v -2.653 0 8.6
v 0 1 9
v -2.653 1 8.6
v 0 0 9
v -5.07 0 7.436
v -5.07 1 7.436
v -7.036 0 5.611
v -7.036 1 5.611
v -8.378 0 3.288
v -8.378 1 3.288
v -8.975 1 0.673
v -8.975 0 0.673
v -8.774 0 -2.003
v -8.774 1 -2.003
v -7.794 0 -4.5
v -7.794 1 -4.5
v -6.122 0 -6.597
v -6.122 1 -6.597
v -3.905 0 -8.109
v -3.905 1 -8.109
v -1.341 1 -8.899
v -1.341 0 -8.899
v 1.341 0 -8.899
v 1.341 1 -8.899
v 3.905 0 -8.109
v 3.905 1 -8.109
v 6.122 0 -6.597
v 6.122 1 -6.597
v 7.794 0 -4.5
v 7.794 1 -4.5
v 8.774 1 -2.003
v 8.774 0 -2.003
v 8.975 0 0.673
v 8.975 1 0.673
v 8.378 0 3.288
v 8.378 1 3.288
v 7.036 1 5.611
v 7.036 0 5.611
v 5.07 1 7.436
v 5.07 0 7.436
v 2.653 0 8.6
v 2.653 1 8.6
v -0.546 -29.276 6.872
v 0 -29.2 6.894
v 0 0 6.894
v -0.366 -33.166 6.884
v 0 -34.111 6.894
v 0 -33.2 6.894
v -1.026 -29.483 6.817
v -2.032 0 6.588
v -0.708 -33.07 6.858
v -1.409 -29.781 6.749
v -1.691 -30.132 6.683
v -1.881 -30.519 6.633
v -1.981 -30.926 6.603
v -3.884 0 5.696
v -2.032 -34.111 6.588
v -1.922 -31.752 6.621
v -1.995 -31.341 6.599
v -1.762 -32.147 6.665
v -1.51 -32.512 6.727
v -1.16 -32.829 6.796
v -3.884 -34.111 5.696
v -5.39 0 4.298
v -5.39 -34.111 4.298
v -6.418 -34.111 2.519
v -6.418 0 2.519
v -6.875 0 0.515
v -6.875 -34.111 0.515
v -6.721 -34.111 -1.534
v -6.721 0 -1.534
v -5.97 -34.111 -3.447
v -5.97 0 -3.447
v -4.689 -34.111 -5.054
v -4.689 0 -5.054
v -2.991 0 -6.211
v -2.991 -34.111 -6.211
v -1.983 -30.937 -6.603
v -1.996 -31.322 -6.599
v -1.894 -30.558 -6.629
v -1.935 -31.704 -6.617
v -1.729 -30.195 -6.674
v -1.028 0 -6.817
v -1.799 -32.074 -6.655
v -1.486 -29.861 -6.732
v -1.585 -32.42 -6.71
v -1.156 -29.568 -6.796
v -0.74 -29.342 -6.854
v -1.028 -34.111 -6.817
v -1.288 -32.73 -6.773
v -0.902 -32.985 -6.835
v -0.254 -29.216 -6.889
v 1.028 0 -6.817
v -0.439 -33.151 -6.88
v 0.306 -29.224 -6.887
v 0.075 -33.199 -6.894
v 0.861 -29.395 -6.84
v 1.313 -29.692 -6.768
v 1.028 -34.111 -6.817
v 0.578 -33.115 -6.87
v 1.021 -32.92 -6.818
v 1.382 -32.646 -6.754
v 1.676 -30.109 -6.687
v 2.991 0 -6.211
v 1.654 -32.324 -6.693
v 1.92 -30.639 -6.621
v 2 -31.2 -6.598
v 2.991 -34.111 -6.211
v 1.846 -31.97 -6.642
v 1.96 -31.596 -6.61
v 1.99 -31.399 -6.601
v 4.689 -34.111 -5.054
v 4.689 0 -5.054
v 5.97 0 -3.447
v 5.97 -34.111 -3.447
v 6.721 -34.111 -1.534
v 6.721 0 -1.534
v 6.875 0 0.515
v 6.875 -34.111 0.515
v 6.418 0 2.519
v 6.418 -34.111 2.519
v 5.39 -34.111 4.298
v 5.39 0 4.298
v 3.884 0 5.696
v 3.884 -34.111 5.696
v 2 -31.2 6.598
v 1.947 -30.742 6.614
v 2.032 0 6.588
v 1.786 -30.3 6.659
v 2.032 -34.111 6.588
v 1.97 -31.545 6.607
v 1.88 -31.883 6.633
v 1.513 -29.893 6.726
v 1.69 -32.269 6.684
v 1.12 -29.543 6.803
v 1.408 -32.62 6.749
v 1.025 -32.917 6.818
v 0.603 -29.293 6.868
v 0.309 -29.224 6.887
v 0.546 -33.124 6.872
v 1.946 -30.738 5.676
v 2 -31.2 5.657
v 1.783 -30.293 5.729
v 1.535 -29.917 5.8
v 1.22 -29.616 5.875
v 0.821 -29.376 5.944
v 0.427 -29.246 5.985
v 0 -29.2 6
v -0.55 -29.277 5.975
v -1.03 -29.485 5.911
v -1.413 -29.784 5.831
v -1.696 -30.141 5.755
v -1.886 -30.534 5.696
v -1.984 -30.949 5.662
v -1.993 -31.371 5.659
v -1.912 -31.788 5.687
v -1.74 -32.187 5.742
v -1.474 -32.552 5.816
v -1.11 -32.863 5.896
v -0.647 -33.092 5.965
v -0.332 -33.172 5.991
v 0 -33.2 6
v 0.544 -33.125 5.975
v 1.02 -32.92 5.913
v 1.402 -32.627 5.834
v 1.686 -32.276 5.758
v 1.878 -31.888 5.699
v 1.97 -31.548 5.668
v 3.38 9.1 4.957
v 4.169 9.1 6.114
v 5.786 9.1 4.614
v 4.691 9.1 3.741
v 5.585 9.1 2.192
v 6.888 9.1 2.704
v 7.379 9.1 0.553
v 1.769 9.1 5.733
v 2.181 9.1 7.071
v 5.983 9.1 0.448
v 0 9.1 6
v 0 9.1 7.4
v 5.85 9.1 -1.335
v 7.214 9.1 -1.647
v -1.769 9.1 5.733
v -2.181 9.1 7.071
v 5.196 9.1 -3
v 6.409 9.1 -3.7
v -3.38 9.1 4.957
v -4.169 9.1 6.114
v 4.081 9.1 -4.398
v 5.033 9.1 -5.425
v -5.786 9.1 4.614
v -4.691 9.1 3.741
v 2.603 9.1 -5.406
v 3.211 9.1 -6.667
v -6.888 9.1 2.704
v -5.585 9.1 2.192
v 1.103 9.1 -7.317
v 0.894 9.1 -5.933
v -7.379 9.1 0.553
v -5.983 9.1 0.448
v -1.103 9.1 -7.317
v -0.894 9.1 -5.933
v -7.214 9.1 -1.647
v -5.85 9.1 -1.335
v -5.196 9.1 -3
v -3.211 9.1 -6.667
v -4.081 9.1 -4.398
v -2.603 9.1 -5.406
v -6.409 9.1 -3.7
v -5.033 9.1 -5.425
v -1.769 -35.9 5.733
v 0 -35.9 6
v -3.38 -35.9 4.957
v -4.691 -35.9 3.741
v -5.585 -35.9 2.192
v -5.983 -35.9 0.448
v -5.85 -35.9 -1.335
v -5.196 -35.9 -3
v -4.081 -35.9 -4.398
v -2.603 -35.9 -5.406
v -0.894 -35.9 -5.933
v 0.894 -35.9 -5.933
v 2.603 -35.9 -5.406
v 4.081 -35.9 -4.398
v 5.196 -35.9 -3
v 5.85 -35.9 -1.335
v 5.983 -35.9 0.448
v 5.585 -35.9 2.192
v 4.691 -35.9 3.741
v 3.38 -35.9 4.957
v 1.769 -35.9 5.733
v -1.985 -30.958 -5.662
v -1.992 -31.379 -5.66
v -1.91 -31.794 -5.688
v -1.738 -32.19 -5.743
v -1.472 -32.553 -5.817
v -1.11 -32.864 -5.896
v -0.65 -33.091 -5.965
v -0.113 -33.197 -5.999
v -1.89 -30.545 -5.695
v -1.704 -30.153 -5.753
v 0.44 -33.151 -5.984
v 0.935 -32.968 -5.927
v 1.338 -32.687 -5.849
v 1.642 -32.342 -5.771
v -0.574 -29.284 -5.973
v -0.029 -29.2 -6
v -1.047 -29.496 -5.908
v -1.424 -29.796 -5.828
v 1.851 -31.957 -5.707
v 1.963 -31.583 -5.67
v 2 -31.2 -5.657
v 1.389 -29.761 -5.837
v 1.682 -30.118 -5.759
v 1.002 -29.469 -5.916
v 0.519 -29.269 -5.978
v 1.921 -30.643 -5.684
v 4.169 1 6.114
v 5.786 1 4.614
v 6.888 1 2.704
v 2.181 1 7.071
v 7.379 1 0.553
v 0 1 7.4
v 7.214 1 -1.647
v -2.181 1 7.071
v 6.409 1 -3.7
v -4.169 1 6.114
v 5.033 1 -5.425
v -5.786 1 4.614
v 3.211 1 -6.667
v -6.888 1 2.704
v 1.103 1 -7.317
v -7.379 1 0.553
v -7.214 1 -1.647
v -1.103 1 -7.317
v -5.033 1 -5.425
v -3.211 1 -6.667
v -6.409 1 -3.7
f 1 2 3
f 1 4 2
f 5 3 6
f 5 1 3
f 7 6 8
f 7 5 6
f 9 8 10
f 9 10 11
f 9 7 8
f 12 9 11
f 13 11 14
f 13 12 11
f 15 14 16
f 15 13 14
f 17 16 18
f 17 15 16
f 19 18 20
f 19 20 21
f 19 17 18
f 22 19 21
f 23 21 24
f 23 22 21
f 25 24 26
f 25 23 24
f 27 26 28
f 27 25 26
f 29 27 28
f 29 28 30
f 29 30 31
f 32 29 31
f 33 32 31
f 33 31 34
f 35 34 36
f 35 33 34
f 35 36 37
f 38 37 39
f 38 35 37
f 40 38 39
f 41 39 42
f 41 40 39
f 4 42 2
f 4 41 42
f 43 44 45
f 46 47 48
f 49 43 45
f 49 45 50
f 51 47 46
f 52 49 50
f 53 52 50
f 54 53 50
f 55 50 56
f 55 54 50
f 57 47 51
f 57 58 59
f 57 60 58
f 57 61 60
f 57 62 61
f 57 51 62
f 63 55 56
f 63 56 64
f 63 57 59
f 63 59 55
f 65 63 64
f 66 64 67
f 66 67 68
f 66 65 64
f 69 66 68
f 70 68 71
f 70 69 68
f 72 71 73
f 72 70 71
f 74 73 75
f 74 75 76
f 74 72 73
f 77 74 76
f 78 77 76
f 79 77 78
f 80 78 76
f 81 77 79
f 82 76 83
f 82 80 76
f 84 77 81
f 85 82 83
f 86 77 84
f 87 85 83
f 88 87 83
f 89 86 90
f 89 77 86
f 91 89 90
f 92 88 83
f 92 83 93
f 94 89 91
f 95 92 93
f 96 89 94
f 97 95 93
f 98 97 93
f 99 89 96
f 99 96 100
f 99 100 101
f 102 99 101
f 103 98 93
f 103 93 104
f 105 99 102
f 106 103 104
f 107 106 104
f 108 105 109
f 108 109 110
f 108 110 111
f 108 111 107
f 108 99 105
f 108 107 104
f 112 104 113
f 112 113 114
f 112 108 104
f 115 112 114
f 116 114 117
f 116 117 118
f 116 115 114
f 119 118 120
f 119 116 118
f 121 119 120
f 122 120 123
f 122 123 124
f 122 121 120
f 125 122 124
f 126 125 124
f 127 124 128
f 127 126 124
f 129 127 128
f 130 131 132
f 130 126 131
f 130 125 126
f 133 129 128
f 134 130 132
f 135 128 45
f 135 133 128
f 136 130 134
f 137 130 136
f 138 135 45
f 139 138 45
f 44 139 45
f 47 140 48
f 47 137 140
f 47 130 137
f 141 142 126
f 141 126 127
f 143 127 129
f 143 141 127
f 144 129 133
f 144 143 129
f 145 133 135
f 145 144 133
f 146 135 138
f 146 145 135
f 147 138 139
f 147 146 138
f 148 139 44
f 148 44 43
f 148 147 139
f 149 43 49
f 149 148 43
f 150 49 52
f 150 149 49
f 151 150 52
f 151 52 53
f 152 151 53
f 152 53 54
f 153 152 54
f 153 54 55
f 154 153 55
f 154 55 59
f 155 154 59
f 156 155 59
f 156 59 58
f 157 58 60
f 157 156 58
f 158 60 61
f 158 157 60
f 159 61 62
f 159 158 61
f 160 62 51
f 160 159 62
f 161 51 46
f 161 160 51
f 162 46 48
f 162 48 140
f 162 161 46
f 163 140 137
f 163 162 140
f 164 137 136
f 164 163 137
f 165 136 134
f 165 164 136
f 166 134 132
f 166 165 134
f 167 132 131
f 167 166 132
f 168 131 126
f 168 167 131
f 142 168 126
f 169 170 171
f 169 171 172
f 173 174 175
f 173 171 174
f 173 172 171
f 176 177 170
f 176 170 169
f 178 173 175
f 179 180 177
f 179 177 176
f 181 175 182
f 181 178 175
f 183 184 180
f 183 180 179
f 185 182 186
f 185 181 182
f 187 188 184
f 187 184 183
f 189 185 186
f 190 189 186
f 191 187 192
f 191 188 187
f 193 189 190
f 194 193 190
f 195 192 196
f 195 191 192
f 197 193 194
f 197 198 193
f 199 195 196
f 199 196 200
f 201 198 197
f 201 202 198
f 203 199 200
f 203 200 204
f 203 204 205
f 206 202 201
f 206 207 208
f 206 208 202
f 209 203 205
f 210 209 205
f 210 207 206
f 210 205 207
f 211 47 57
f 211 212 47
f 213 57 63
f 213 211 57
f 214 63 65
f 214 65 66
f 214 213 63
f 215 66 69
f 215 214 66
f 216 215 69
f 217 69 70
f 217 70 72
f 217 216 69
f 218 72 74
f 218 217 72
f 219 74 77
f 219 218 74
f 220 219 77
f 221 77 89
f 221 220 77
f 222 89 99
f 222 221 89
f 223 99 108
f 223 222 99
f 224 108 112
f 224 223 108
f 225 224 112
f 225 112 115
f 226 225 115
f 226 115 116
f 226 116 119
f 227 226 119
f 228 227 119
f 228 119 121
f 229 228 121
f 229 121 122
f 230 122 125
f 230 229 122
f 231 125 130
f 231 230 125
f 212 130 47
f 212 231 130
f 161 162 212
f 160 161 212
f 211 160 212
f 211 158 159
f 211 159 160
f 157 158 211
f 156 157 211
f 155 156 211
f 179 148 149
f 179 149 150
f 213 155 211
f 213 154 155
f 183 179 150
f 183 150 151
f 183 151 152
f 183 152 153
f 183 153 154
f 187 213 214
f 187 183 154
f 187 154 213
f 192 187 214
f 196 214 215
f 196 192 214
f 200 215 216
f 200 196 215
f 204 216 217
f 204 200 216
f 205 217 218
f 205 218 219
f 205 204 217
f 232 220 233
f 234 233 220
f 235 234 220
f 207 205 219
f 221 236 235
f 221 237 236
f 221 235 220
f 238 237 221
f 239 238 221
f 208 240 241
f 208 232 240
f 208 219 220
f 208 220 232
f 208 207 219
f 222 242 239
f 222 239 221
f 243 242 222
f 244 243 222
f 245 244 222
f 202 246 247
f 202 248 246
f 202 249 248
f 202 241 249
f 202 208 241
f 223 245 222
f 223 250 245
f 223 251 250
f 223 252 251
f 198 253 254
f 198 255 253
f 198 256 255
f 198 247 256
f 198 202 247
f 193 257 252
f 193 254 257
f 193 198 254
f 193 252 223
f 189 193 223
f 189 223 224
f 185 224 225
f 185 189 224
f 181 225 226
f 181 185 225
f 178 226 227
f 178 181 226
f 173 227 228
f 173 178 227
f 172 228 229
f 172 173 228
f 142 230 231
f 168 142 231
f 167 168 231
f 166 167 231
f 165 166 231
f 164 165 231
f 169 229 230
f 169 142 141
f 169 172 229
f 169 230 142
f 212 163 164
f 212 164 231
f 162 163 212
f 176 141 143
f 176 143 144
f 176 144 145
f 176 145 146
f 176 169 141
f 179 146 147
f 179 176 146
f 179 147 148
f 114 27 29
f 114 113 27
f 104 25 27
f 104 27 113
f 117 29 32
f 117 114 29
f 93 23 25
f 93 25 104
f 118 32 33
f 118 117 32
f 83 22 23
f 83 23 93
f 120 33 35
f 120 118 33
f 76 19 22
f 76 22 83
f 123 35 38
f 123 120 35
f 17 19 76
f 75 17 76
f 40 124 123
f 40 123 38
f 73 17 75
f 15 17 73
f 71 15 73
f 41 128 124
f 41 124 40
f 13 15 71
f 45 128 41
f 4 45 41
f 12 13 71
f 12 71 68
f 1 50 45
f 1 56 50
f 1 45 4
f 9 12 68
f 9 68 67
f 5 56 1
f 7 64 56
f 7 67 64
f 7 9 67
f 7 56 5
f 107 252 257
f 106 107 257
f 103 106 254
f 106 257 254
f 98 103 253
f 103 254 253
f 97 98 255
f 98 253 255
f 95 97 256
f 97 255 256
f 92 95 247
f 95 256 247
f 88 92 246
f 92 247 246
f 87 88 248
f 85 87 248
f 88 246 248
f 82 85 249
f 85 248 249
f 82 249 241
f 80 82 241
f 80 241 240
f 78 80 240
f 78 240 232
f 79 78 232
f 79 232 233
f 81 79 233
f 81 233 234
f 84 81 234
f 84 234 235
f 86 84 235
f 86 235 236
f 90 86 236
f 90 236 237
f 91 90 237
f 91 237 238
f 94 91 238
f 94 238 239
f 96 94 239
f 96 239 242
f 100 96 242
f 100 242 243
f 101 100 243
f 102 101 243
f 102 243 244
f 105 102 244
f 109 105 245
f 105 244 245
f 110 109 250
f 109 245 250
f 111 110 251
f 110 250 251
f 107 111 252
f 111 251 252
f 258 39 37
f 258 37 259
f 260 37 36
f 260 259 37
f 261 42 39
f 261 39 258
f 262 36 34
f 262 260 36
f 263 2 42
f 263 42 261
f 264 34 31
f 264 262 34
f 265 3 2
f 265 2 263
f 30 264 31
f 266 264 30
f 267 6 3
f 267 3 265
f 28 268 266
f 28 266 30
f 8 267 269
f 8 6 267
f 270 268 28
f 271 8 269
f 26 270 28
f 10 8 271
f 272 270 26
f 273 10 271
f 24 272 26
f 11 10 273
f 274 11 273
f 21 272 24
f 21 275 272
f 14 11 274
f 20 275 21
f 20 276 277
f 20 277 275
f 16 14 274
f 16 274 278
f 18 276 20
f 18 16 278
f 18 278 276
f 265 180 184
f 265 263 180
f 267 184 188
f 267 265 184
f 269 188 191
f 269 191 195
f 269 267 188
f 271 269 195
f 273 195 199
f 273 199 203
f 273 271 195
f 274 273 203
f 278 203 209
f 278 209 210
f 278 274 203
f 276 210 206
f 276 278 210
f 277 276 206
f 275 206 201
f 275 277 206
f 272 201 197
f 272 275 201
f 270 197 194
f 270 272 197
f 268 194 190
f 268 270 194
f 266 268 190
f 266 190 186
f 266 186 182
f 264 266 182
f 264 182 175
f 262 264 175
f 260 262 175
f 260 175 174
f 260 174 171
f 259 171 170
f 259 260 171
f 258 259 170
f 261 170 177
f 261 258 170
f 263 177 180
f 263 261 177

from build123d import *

# Parameters (mm, degrees)
SKETCH_2_R               = 2
CUT_EXTRUDE_1_DEPTH      = 10
CUT_EXTRUDE_1_DEPTH_BACK = 10


with BuildPart() as part:
    # Эскиз1 → Повернуть1 (revolve)
    with BuildSketch(Plane.XY, mode=Mode.PRIVATE) as revolve_1_sk:
        Polygon((-7.4, 9.1), (-7.4, 1), (-9, 1), (-9, 0), (-6.894121554, 0), (-6.894121554, -34.110992832), (-6, -35.9), (-6, 9.1), align=None)
    revolve(revolve_1_sk.sketch.rotate(Axis((0, 30.712290503, 0), (0, -1, 0)), 270), axis=Axis((0, 30.712290503, 0), (0, -1, 0)))  # turned: the seam where the file's is

    # Эскиз2 → Вырез-Вытянуть1 (cut, two sides)
    with BuildSketch(Plane.XY) as cut_extrude_1_sk:
        with Locations((0, -31.2)):
            Circle(SKETCH_2_R)
    extrude(amount=CUT_EXTRUDE_1_DEPTH, mode=Mode.SUBTRACT)
    extrude(cut_extrude_1_sk.sketch, amount=-CUT_EXTRUDE_1_DEPTH_BACK, mode=Mode.SUBTRACT)


solid = part.part
